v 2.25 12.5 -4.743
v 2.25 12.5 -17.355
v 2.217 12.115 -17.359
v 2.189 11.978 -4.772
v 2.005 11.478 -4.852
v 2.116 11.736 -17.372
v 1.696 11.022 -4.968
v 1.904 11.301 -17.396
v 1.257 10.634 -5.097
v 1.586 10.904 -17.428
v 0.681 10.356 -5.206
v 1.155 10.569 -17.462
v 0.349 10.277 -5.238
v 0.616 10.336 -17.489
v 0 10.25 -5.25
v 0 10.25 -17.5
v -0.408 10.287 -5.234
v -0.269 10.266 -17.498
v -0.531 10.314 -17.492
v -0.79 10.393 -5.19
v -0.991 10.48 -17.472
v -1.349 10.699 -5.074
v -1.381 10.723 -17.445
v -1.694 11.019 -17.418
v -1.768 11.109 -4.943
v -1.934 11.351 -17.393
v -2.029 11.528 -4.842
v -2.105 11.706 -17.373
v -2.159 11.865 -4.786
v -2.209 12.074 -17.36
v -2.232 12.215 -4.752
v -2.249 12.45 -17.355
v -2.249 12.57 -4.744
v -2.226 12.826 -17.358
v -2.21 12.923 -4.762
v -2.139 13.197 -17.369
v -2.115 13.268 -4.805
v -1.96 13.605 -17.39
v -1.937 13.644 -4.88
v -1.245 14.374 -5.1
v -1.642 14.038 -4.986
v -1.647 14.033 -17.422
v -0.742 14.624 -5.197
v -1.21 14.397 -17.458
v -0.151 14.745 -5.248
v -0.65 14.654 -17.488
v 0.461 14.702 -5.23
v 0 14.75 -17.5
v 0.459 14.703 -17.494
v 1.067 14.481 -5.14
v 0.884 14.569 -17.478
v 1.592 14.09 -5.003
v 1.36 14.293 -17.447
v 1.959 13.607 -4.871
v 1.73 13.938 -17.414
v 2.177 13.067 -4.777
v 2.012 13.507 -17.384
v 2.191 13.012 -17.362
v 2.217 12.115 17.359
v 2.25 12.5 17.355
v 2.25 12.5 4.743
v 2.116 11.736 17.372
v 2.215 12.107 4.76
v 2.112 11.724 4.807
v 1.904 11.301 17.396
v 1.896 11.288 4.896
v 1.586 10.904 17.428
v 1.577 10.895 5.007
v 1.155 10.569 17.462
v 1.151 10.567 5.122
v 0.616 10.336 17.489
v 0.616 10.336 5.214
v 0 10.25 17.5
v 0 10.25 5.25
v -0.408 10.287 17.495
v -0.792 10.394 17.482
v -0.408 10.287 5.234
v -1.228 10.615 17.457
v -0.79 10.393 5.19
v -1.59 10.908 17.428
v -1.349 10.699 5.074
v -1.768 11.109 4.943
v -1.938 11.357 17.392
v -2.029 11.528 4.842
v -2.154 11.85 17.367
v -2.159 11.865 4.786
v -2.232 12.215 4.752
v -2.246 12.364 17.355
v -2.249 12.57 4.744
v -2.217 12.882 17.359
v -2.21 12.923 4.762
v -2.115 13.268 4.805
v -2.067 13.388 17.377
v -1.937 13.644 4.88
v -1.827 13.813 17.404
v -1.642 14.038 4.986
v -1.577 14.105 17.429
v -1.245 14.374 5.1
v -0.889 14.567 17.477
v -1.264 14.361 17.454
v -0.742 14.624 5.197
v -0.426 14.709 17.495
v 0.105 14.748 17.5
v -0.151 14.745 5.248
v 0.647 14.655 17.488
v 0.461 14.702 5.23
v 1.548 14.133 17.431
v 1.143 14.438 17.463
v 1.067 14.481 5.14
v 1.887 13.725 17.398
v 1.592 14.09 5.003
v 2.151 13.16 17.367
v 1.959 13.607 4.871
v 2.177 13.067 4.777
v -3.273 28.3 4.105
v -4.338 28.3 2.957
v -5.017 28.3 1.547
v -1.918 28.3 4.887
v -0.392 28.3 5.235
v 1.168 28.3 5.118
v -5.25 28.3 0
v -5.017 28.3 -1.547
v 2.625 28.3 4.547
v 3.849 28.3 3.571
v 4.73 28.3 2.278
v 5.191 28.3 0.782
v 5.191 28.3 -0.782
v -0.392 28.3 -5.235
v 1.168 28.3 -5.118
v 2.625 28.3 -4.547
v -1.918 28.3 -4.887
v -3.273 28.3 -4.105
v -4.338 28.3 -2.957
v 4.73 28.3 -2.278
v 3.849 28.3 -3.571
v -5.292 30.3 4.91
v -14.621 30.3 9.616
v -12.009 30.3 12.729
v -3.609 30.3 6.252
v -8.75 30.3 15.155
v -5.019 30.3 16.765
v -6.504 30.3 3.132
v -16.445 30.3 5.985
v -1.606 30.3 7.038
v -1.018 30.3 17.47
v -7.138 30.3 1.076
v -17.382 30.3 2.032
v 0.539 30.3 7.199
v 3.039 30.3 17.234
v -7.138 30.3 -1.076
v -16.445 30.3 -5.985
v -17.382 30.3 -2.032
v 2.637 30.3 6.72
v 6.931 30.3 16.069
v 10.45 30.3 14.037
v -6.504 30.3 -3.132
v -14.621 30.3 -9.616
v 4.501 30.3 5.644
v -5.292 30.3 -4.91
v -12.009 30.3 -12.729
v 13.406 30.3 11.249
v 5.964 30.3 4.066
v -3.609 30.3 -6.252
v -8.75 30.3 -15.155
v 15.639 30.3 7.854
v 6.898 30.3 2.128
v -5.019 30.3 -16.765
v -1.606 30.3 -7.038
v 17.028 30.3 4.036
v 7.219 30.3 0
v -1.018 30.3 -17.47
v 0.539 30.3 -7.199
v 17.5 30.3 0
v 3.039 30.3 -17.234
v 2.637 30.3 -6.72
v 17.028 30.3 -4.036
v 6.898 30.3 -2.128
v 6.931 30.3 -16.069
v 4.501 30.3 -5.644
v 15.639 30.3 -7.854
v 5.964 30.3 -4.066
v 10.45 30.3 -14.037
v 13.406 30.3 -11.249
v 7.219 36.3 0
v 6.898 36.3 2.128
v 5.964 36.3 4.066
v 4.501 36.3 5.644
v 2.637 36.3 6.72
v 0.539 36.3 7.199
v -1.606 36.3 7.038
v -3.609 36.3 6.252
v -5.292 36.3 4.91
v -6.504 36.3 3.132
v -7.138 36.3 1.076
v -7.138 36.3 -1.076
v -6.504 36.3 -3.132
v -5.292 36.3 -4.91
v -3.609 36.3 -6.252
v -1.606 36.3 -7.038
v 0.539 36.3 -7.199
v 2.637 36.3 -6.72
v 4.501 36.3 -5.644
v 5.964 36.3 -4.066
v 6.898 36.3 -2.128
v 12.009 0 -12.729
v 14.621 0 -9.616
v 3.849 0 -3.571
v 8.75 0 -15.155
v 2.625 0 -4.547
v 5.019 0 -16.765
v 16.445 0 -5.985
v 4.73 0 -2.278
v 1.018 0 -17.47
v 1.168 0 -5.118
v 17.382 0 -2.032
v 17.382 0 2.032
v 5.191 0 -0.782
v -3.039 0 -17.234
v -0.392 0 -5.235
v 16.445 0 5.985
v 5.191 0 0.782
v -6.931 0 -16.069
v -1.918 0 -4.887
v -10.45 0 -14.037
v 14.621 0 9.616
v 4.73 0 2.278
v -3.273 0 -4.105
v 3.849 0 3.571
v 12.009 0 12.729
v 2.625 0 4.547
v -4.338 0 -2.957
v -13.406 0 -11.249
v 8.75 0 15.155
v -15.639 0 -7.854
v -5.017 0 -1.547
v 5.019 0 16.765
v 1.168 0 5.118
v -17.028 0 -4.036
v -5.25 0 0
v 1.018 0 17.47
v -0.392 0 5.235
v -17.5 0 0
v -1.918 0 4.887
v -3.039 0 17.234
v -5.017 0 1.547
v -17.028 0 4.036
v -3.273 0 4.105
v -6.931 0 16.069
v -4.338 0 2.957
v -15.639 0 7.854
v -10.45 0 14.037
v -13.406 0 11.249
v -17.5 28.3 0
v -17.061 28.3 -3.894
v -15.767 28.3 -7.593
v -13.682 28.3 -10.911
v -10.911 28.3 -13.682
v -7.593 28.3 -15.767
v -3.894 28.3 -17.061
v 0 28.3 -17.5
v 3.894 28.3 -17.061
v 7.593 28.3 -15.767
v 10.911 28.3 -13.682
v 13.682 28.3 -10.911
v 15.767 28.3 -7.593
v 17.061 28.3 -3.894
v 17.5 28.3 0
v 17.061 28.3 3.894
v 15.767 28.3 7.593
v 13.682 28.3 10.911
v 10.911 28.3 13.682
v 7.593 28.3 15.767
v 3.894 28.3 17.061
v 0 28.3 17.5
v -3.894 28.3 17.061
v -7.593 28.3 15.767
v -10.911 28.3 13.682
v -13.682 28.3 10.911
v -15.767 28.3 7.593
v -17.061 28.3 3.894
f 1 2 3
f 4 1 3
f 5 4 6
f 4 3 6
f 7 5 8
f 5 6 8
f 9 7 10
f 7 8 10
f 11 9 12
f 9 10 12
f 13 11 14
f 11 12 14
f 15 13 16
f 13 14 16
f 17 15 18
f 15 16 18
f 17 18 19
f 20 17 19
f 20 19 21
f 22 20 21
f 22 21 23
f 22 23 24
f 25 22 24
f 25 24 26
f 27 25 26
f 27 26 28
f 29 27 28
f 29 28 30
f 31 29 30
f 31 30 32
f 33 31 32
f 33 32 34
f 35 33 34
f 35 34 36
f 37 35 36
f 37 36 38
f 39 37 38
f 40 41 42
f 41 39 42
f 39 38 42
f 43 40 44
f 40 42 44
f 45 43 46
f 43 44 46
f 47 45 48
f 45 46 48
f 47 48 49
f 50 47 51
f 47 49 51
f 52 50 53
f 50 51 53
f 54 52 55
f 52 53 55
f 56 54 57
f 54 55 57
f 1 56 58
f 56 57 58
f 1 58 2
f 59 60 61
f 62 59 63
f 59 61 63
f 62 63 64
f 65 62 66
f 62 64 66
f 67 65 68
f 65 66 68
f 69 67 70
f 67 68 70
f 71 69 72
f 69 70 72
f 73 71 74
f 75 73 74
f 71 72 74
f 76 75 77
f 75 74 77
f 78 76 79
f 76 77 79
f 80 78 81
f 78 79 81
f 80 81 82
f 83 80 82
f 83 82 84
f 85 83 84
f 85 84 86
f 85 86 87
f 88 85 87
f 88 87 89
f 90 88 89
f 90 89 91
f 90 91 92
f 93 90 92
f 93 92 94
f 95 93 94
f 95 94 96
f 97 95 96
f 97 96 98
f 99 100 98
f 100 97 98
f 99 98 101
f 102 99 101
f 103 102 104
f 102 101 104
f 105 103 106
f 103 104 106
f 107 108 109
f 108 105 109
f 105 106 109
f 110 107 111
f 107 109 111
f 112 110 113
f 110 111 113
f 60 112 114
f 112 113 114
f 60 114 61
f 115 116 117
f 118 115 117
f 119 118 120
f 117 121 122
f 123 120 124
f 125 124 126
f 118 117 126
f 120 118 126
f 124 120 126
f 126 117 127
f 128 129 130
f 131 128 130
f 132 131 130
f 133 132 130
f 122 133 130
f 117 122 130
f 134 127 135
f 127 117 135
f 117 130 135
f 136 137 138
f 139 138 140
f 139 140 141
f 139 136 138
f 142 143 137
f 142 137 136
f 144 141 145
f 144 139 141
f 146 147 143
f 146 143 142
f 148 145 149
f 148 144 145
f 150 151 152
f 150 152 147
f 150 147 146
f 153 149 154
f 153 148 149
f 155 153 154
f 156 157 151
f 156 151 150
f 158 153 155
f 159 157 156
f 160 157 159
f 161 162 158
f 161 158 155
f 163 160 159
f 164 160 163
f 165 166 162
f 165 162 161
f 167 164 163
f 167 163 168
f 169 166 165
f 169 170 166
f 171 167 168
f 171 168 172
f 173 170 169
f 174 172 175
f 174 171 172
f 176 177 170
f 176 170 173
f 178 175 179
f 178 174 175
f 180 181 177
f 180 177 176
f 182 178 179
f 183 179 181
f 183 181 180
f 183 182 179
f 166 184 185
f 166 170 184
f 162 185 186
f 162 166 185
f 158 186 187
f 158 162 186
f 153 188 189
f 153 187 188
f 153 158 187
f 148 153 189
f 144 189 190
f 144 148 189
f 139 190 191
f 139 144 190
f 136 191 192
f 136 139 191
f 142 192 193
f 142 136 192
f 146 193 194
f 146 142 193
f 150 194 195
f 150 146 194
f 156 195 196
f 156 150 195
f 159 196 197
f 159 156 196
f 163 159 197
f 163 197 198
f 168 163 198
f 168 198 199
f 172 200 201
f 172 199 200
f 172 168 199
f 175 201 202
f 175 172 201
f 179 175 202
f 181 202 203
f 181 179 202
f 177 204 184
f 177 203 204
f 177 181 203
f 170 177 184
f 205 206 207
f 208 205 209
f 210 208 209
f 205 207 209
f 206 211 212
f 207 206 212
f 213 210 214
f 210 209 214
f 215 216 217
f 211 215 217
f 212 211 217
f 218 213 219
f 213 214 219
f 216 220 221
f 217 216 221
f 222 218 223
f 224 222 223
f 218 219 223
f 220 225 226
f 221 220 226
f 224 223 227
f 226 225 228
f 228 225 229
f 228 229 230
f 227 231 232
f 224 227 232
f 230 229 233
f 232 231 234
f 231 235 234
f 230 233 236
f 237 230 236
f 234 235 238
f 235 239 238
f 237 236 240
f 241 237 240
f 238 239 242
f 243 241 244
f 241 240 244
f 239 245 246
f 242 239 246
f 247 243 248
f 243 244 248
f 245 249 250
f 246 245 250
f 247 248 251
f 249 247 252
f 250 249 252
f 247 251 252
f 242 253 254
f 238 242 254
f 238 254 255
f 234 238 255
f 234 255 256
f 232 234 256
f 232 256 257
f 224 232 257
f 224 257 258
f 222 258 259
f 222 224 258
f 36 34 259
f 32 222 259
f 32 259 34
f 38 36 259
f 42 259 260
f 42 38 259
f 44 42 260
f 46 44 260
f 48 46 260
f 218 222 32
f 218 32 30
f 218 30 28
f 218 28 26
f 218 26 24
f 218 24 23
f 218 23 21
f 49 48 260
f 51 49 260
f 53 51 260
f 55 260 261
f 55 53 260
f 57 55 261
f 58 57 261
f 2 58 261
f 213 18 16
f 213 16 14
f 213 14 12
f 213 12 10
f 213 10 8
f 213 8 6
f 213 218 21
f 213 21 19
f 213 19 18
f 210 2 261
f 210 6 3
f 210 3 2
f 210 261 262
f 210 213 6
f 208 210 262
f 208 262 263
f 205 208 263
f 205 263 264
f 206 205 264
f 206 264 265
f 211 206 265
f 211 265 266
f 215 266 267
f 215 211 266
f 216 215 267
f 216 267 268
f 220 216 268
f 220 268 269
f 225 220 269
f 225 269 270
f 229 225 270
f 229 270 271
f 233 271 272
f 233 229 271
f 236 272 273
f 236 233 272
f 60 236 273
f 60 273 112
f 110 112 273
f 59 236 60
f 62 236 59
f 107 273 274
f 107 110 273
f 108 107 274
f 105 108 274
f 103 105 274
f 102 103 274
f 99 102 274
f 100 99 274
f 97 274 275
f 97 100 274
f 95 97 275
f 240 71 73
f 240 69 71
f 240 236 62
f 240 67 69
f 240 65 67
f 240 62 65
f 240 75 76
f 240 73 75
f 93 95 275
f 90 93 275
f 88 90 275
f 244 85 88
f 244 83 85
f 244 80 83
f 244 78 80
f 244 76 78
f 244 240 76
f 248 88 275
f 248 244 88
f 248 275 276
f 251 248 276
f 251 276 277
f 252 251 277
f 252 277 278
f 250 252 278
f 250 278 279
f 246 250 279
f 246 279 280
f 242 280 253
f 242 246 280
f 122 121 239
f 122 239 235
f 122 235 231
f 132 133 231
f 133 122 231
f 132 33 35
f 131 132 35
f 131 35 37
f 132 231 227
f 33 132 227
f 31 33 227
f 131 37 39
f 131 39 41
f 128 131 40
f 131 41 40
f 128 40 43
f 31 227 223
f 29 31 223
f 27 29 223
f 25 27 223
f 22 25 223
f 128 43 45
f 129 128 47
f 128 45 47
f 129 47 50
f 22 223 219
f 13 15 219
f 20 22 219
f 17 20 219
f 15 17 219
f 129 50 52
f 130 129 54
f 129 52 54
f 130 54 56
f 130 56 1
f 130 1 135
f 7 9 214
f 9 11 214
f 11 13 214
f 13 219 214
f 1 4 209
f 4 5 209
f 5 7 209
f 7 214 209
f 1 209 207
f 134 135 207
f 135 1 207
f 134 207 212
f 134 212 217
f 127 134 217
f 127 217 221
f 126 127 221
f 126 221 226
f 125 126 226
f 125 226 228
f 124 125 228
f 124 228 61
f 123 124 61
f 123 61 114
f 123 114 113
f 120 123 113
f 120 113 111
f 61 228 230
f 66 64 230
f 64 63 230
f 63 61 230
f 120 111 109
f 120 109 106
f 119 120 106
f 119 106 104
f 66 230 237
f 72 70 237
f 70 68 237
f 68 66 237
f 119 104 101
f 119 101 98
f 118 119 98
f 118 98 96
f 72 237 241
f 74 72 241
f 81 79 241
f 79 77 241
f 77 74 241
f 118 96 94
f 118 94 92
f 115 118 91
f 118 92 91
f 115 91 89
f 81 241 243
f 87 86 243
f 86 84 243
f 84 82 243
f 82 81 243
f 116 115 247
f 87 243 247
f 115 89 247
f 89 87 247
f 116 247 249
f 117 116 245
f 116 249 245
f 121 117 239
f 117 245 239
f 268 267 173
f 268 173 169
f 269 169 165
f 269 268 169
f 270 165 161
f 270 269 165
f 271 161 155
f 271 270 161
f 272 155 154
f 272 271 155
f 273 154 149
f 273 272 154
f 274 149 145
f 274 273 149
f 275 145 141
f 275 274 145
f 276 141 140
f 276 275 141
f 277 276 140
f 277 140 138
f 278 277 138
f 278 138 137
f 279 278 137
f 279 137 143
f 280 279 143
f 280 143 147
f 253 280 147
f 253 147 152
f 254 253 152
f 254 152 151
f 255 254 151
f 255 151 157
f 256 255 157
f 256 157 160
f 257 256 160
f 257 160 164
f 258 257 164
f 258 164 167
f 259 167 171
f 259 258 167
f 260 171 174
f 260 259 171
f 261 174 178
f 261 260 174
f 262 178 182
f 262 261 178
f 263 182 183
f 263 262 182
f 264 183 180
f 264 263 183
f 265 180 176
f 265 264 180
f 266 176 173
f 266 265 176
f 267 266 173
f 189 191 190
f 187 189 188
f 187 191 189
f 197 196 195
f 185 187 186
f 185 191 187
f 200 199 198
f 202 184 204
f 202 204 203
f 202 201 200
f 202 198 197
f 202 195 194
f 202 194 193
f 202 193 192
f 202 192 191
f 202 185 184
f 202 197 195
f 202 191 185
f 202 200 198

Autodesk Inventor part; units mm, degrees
ref_plane "YZ Plane" through (0, 0, 0) normal (1, 0, 0) x (0, 1, 0)
ref_plane "XZ Plane" through (0, 0, 0) normal (0, 1, 0) x (-1, 0, 0)
sketch "Sketch1" plane through (0, 0, 0) normal (0, 1, 0) x (-1, 0, 0)
  circle A0 centre (0, 0) radius 17.5
  circle A1 centre (0, 0) radius 5.25
  dimension "d0" = 35
  dimension "d3" = 10.5
extrude "Extrusion1" add sketch "Sketch1" along normal blind 28.3
ref_plane "Work Plane1" through (0, 0, -17.5) normal (0, 0, 1) x (1, 0, 0)
sketch "Sketch2" plane through (0, 0, -17.5) normal (0, 0, 1) x (1, 0, 0)
  line L0 (0, 0) -> (0, 12.5)
  circle A0 centre (0, 12.5) radius 2.25
  dimension "d4" = 12.5
  dimension "d5" = 4.5
extrude "Extrusion2" cut sketch "Sketch2" along normal through all
sketch "Sketch3" plane through (0, 28.3, 0) normal (0, 1, 0) x (1, 0, 0)
  circle A0 centre (0, 0) radius 17.5
extrude "Extrusion3" add sketch "Sketch3" along normal blind 2
sketch "Sketch4" plane through (0, 30.3, 0) normal (0, 1, 0) x (1, 0, 0)
  circle A0 centre (0, 0) radius 2.75
  circle A1 centre (0, 0) radius 7.2188
  dimension "d10" = 5.5
extrude "Extrusion4" add sketch "Sketch4" along normal blind 6 contours A0 | A1
properties part number "StuurPotentiometerConnector"
